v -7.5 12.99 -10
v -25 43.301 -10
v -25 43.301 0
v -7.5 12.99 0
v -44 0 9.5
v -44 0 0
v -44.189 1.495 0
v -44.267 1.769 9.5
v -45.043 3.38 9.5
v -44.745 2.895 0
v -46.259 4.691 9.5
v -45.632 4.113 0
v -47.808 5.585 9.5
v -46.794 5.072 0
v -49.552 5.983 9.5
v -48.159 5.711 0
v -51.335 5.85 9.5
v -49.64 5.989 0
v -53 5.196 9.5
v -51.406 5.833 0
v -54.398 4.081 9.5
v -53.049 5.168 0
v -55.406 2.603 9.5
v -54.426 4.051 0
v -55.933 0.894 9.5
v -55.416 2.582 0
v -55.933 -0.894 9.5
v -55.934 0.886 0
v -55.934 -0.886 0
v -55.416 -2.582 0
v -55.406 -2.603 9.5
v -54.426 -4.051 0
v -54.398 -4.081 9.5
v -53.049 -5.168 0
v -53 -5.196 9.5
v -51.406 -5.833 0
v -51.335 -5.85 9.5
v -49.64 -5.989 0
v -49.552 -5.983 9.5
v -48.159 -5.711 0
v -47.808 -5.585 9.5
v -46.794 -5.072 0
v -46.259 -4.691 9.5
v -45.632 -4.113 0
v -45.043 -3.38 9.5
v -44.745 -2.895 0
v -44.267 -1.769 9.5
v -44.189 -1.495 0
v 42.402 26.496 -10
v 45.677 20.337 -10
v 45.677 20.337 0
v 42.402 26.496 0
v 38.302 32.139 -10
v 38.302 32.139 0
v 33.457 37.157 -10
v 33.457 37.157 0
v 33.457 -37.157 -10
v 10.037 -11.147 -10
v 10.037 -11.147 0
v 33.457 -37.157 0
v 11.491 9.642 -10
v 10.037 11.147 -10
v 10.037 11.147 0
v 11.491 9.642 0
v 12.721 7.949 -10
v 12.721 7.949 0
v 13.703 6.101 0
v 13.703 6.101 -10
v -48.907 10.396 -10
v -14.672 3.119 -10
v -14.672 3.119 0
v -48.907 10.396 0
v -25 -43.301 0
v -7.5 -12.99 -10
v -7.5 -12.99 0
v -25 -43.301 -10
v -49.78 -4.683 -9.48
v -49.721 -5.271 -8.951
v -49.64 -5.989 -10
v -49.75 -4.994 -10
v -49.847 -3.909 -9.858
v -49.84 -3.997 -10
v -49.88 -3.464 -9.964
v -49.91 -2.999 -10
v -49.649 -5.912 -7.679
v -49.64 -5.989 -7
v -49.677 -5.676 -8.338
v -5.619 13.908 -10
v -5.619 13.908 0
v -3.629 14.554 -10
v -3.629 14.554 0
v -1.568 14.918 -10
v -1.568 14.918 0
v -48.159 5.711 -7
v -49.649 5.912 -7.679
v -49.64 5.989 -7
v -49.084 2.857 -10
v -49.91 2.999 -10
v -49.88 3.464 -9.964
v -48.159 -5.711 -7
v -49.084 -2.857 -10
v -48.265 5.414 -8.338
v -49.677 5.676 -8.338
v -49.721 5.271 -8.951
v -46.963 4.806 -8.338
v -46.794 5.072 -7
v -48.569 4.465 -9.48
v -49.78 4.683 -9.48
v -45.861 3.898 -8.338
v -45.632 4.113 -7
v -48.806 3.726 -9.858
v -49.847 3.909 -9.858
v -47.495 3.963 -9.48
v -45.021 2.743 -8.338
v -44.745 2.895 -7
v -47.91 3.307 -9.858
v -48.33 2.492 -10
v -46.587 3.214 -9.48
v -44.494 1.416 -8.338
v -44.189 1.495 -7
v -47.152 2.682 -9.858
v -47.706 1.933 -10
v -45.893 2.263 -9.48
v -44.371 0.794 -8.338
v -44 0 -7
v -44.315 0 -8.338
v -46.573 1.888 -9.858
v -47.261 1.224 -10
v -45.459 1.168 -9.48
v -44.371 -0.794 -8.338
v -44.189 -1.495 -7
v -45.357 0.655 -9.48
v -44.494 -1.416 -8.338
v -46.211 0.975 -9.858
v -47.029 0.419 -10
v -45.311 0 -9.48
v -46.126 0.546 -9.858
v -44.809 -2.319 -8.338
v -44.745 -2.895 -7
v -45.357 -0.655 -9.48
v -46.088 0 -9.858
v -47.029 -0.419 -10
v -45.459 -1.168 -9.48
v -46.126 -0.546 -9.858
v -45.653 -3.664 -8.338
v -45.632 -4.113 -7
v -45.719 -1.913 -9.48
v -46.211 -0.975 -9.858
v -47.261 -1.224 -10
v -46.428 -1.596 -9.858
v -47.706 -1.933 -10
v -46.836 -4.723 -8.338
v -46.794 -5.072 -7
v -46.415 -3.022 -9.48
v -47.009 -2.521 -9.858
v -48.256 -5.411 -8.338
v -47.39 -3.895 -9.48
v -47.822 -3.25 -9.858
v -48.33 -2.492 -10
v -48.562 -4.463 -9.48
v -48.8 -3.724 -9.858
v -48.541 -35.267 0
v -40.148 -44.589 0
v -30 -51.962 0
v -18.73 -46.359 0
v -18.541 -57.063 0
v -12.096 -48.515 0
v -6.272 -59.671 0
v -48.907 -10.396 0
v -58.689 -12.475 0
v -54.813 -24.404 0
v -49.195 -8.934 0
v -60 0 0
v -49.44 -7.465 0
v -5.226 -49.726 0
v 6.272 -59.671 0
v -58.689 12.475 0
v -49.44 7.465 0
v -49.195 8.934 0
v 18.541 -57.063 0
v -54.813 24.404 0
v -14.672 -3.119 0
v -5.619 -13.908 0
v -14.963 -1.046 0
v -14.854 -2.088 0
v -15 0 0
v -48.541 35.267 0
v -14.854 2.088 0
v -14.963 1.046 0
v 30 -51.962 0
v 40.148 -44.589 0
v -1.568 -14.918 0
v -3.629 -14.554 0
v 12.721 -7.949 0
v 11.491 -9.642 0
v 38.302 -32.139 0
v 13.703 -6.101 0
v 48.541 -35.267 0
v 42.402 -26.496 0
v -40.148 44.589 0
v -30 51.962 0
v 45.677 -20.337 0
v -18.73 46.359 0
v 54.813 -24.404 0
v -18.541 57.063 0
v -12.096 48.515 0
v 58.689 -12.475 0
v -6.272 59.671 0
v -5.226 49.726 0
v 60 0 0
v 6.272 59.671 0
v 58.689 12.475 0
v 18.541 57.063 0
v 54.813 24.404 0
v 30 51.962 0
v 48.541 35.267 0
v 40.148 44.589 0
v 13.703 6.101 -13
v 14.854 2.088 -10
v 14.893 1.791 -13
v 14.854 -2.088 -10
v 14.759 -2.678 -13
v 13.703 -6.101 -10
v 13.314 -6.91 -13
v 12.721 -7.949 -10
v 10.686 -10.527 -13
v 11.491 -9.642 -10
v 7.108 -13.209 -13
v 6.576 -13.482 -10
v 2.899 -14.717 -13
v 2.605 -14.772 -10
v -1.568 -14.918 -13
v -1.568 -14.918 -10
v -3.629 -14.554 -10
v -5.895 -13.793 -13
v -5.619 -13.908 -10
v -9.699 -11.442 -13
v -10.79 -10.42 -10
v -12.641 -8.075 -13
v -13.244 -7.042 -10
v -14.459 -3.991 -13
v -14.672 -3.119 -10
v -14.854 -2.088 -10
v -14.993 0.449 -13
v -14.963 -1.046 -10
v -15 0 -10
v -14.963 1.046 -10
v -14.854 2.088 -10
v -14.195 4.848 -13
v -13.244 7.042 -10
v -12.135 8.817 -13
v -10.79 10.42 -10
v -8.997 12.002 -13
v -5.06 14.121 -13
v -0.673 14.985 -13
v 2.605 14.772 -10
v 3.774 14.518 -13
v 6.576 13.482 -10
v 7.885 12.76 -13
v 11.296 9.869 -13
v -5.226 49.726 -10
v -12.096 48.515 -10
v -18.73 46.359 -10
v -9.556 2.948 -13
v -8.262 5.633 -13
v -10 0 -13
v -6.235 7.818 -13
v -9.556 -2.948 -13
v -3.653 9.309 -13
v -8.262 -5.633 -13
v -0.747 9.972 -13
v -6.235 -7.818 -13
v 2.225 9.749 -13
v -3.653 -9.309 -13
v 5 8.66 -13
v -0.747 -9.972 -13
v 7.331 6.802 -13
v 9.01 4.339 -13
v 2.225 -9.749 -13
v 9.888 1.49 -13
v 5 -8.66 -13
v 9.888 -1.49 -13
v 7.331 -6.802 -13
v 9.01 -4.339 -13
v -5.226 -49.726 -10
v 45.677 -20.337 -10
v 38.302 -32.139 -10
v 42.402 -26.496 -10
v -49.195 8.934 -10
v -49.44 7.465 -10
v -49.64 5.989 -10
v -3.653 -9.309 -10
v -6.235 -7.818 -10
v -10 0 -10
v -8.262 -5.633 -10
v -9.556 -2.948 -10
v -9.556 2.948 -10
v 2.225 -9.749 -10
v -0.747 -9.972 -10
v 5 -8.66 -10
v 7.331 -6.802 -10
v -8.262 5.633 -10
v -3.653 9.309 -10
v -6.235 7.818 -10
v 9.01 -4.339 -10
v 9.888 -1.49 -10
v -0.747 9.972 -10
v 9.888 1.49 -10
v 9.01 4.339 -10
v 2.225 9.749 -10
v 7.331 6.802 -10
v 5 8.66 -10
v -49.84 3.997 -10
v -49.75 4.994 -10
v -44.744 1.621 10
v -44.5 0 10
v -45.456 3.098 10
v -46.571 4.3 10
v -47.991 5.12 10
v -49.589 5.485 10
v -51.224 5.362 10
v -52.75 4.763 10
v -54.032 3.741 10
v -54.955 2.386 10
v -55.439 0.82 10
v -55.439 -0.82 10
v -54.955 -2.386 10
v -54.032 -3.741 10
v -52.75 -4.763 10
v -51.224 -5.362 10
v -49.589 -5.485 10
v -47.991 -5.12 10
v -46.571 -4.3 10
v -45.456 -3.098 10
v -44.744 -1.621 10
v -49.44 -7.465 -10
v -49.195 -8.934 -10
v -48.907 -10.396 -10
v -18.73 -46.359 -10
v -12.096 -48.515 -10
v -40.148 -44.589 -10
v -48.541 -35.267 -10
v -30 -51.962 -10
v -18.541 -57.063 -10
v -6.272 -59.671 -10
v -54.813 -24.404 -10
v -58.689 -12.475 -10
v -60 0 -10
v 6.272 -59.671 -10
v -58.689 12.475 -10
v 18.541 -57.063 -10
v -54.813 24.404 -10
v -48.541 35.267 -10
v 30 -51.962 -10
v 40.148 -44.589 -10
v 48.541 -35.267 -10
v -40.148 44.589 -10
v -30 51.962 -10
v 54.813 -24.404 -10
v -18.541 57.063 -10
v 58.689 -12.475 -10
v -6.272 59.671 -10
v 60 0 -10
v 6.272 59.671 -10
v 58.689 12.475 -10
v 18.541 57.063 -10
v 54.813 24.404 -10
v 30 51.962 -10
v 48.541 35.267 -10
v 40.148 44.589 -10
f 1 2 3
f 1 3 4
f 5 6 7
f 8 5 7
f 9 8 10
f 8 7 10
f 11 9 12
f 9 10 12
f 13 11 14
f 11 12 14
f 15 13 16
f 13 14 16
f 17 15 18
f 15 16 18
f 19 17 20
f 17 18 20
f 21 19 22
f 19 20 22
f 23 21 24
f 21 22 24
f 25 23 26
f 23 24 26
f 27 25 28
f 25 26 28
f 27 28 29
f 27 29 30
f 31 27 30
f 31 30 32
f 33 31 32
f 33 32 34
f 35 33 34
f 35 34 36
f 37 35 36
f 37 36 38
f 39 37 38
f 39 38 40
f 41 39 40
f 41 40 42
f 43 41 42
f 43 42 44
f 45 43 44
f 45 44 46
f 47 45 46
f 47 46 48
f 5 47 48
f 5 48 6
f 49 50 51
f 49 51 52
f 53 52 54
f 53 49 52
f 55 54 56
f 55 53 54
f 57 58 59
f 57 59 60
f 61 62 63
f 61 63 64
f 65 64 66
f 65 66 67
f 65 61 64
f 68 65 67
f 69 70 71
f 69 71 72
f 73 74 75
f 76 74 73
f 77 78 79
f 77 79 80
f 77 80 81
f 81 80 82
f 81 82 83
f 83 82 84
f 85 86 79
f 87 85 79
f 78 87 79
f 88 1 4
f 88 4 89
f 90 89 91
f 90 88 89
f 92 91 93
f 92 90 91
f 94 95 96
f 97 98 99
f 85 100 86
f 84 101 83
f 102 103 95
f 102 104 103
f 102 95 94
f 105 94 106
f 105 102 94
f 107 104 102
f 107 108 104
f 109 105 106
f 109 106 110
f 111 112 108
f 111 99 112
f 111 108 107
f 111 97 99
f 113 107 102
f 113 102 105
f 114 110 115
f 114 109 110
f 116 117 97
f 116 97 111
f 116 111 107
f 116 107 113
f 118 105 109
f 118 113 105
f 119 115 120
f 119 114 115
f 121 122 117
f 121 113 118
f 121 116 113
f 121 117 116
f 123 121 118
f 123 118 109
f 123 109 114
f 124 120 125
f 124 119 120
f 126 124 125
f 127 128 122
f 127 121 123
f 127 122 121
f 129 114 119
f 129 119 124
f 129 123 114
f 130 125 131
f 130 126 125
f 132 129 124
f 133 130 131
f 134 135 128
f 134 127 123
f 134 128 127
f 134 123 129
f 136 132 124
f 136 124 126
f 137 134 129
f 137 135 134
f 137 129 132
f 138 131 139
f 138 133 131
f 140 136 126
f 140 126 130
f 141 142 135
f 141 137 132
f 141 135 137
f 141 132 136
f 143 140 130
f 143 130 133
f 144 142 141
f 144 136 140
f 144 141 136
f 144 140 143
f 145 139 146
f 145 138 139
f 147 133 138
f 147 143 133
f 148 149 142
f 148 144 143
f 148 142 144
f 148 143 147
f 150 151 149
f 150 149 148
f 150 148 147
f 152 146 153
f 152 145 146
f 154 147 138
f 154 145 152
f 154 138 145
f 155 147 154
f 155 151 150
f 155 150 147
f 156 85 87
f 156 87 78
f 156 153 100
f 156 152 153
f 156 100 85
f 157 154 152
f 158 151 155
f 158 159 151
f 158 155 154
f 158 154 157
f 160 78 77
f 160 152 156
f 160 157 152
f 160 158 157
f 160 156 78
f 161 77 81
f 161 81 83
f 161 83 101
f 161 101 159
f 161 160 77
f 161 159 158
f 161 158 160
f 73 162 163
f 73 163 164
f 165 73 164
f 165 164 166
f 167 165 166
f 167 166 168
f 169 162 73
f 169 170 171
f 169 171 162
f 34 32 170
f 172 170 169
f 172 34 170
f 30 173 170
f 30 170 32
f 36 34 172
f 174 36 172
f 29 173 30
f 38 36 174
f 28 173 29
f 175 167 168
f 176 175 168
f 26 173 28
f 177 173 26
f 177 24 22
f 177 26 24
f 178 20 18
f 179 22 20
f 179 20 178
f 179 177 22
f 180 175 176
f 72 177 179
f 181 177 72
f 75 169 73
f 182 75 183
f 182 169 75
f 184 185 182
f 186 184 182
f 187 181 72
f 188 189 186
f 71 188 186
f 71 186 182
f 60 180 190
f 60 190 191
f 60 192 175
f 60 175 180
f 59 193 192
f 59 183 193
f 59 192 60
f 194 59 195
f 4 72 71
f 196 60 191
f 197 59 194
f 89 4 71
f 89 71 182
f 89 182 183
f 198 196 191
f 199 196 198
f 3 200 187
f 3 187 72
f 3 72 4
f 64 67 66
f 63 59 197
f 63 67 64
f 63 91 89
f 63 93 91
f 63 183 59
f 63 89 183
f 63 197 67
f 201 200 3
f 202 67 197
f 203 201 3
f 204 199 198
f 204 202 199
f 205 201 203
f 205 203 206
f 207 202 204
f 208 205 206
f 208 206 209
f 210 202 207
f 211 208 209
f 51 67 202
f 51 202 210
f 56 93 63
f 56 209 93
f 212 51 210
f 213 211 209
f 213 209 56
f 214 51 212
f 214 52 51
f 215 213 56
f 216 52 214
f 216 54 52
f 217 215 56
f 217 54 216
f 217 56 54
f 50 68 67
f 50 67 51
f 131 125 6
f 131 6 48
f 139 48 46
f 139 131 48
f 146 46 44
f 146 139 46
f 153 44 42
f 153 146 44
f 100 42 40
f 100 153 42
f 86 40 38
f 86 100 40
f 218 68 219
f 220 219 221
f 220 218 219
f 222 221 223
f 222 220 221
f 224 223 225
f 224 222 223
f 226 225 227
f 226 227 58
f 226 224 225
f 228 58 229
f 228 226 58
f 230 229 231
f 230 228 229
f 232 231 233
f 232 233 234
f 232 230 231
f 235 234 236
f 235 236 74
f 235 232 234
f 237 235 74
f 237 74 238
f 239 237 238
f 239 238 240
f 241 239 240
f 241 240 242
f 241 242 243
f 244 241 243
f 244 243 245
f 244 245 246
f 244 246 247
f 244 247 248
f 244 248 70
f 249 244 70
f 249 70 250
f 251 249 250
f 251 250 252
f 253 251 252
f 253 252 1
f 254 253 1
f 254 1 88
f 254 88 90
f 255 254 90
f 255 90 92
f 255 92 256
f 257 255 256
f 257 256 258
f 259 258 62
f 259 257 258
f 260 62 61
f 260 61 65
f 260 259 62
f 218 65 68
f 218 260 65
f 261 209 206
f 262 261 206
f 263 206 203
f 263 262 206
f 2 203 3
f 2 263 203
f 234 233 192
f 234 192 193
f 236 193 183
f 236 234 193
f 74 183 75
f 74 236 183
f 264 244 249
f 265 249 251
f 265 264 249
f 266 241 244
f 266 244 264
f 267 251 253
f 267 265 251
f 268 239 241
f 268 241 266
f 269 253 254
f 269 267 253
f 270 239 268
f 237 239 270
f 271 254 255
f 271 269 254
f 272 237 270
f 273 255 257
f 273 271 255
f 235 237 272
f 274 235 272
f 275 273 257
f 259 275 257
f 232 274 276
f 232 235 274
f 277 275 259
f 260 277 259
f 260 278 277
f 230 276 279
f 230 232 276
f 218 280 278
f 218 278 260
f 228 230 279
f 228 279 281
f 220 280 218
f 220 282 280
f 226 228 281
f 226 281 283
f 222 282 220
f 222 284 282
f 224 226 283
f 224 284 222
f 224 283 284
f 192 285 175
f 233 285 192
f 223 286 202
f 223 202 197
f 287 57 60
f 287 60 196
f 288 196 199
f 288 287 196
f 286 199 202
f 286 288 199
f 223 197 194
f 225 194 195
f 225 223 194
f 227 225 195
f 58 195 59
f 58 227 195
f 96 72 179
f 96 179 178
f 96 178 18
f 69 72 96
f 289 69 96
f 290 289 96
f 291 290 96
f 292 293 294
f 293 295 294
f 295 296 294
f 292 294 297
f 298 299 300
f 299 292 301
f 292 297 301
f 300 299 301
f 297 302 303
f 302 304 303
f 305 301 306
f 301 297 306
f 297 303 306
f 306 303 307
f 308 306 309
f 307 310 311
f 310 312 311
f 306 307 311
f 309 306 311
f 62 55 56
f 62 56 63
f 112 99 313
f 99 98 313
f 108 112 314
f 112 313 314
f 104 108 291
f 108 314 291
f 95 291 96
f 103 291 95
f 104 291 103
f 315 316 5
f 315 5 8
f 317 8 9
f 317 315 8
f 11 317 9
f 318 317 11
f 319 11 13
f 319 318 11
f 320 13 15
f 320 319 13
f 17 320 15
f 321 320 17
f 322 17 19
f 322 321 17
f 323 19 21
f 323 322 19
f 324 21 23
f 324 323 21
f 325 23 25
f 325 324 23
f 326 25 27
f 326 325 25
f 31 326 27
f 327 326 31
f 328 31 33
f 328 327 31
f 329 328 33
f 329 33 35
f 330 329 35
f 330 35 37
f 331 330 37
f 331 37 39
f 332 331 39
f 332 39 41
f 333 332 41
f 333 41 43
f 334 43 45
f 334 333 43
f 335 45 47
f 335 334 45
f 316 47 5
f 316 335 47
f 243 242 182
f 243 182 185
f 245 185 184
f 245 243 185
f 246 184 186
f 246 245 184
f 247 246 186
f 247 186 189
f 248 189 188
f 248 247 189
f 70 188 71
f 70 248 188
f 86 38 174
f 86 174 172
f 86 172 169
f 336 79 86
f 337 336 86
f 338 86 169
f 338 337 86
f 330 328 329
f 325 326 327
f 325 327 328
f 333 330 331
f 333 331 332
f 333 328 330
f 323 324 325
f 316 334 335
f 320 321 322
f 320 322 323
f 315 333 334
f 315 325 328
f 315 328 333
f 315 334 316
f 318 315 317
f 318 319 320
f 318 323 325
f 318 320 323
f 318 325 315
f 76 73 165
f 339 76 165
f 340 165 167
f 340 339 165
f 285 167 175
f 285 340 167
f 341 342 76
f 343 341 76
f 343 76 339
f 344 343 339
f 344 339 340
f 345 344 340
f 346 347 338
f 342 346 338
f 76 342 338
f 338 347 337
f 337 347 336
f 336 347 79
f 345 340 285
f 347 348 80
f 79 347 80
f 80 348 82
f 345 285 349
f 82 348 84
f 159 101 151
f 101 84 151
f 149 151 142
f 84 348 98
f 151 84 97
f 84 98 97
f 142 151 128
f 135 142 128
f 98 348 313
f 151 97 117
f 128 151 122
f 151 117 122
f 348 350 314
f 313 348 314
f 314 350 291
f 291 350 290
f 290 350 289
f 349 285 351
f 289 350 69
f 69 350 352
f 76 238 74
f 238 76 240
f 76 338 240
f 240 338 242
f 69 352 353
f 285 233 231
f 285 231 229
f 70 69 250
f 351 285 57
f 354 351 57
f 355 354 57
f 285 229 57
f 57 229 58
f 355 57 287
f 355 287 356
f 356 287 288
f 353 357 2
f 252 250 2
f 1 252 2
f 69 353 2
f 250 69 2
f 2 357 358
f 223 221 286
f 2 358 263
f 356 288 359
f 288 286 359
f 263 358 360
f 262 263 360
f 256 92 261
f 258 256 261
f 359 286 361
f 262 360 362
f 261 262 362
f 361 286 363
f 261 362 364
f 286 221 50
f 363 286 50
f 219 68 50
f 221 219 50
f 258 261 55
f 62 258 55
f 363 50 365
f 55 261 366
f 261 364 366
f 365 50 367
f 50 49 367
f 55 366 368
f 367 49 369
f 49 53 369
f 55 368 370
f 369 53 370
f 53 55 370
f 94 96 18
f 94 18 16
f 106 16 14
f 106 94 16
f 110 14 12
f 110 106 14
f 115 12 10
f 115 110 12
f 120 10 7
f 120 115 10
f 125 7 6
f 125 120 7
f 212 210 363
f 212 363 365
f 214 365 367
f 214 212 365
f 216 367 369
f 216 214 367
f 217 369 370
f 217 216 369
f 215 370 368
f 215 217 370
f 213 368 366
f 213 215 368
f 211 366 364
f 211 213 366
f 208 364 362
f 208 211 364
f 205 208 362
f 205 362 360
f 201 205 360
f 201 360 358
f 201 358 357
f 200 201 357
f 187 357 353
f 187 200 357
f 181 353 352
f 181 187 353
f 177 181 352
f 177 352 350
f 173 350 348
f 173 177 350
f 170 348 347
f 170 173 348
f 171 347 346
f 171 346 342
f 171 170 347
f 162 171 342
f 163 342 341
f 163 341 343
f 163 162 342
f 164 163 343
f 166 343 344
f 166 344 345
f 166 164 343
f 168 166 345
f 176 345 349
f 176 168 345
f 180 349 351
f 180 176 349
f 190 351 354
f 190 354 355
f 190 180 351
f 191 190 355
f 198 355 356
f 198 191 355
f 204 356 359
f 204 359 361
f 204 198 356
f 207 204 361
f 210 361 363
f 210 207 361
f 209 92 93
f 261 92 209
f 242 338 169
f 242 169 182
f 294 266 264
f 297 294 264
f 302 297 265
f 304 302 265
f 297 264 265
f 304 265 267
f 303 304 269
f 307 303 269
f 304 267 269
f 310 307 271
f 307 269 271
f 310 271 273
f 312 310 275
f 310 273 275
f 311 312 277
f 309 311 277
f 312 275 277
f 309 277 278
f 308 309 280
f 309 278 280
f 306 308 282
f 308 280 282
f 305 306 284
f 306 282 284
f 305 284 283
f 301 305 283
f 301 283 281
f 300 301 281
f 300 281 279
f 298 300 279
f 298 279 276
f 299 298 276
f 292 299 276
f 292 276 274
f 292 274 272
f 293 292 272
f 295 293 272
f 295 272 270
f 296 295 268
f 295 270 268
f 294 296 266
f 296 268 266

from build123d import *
from build123d.topology import SkipClean

# Parameters (mm, degrees)
SKETCH1_R           = 60
BOSS_EXTRUDE1_DEPTH = 10
SKETCH1_3_R         = 6
BOSS_EXTRUDE2_DEPTH = 10
CUT_EXTRUDE1_START  = -10
CUT_EXTRUDE1_DEPTH  = 10
BOSS_EXTRUDE4_START = 3
SKETCH3_R           = 15
SKETCH3_R_2         = 10
BOSS_EXTRUDE4_DEPTH = 3
FILLET1_R           = 3
CHAMFER1_SIZE       = 0.5


with BuildPart() as part:
    # Sketch1 → Boss-Extrude1 (new body)
    with BuildSketch(Plane.XY):
        Circle(SKETCH1_R)
    extrude(amount=-BOSS_EXTRUDE1_DEPTH)

    # Sketch1<3> → Boss-Extrude2 (add)
    with BuildSketch(Plane.XY):
        with Locations((-50, 0)):
            Circle(SKETCH1_3_R)
    extrude(amount=BOSS_EXTRUDE2_DEPTH)

    # Sketch2 → Cut-Extrude1 (cut)
    with SkipClean():  # the faces are left unmerged after this step: merging them gives an invalid solid
        with BuildSketch(Plane.XY.offset(CUT_EXTRUDE1_START)):
            with BuildLine():
                ThreePointArc((-14.672214011, -3.118675362), (-14.917828431, -1.567926949), (-15, 0))
                Line((-15, 0), (-44, 0))
                ThreePointArc((-44, 0), (-45.631934066, -4.11339276), (-49.64, -5.989190262))
                ThreePointArc((-49.64, -5.989190262), (-49.322921706, -8.200572806), (-48.907380037, -10.395584541))
                Line((-48.907380037, -10.395584541), (-14.672214011, -3.118675362))
            make_face()
            with BuildLine():
                Line((-44, 0), (-15, 0))
                ThreePointArc((-15, 0), (-14.917828431, 1.567926949), (-14.672214011, 3.118675362))
                Line((-14.672214011, 3.118675362), (-48.907380037, 10.395584541))
                ThreePointArc((-48.907380037, 10.395584541), (-49.322921706, 8.200572806), (-49.64, 5.989190262))
                ThreePointArc((-49.64, 5.989190262), (-45.631934066, 4.11339276), (-44, 0))
            make_face()
            with BuildLine():
                Line((-25, 43.301270189), (-7.5, 12.990381057))
                ThreePointArc((-7.5, 12.990381057), (-4.635254916, 14.265847744), (-1.567926949, 14.917828431))
                Line((-1.567926949, 14.917828431), (-5.226423163, 49.726094768))
                ThreePointArc((-5.226423163, 49.726094768), (-15.450849719, 47.552825815), (-25, 43.301270189))
            make_face()
            with BuildLine():
                ThreePointArc((10.036959095, 11.147172382), (12.135254916, 8.816778784), (13.703181865, 6.101049646))
                Line((13.703181865, 6.101049646), (45.677272882, 20.336832154))
                ThreePointArc((45.677272882, 20.336832154), (40.450849719, 29.389262615), (33.456530318, 37.157241274))
                Line((33.456530318, 37.157241274), (10.036959095, 11.147172382))
            make_face()
            with BuildLine():
                ThreePointArc((13.703181865, -6.101049646), (12.135254916, -8.816778784), (10.036959095, -11.147172382))
                Line((10.036959095, -11.147172382), (33.456530318, -37.157241274))
                ThreePointArc((33.456530318, -37.157241274), (40.450849719, -29.389262615), (45.677272882, -20.336832154))
                Line((45.677272882, -20.336832154), (13.703181865, -6.101049646))
            make_face()
            with BuildLine():
                ThreePointArc((-1.567926949, -14.917828431), (-4.635254916, -14.265847744), (-7.5, -12.990381057))
                Line((-7.5, -12.990381057), (-25, -43.301270189))
                ThreePointArc((-25, -43.301270189), (-15.450849719, -47.552825815), (-5.226423163, -49.726094768))
                Line((-5.226423163, -49.726094768), (-1.567926949, -14.917828431))
            make_face()
        extrude(amount=CUT_EXTRUDE1_DEPTH, mode=Mode.SUBTRACT)

    # Sketch3 → Boss-Extrude4 (add)
    with SkipClean():  # the faces are left unmerged after this step: merging them gives an invalid solid
        with BuildSketch(Plane(origin=(0, 0, -10), x_dir=(-1, 0, 0), z_dir=(0, 0, -1)).offset(BOSS_EXTRUDE4_START)):
            with Locations(Location((0, 0, 0), (0, 0, 156))):
                Circle(SKETCH3_R)
            Circle(SKETCH3_R_2, mode=Mode.SUBTRACT)
        extrude(amount=-BOSS_EXTRUDE4_DEPTH)

    # Fillet1
    # the kernel refuses this fillet: 3 mm, written as the material it takes off along each edge
    with BuildSketch(Plane(origin=(-50, 0, -10), x_dir=(-0.9290450691294319, 0.3699665654167807, 0), z_dir=(-0.3699665654167807, -0.9290450691294319, 0))) as fillet1_piece_1_section:
        with BuildLine():
            CenterArc((6 - FILLET1_R, -FILLET1_R), FILLET1_R, 0, 90)
            Line((6, -FILLET1_R), (6, 0))
            Line((6, 0), (6 - FILLET1_R, 0))
        make_face()
    fillet1_piece_1 = revolve(axis=Axis((-50, 0, -10), (0, 0, -1)), revolution_arc=316.572889398, mode=Mode.PRIVATE)
    fillet1_piece_1 = fillet1_piece_1 & Plane(origin=(0, 0, -9.144891987), x_dir=(-0.9928000000000012, -0.1197838052492802, 0), z_dir=(0, 0, -1)) * Cylinder(50, 24, mode=Mode.PRIVATE)
    add(fillet1_piece_1, mode=Mode.SUBTRACT)

    # Chamfer1
    chamfer1_edges = [part.edges().sort_by_distance(p)[0] for p in [
        (-56, 0, 10),
    ]]
    chamfer(chamfer1_edges, length=CHAMFER1_SIZE)


solid = part.part
